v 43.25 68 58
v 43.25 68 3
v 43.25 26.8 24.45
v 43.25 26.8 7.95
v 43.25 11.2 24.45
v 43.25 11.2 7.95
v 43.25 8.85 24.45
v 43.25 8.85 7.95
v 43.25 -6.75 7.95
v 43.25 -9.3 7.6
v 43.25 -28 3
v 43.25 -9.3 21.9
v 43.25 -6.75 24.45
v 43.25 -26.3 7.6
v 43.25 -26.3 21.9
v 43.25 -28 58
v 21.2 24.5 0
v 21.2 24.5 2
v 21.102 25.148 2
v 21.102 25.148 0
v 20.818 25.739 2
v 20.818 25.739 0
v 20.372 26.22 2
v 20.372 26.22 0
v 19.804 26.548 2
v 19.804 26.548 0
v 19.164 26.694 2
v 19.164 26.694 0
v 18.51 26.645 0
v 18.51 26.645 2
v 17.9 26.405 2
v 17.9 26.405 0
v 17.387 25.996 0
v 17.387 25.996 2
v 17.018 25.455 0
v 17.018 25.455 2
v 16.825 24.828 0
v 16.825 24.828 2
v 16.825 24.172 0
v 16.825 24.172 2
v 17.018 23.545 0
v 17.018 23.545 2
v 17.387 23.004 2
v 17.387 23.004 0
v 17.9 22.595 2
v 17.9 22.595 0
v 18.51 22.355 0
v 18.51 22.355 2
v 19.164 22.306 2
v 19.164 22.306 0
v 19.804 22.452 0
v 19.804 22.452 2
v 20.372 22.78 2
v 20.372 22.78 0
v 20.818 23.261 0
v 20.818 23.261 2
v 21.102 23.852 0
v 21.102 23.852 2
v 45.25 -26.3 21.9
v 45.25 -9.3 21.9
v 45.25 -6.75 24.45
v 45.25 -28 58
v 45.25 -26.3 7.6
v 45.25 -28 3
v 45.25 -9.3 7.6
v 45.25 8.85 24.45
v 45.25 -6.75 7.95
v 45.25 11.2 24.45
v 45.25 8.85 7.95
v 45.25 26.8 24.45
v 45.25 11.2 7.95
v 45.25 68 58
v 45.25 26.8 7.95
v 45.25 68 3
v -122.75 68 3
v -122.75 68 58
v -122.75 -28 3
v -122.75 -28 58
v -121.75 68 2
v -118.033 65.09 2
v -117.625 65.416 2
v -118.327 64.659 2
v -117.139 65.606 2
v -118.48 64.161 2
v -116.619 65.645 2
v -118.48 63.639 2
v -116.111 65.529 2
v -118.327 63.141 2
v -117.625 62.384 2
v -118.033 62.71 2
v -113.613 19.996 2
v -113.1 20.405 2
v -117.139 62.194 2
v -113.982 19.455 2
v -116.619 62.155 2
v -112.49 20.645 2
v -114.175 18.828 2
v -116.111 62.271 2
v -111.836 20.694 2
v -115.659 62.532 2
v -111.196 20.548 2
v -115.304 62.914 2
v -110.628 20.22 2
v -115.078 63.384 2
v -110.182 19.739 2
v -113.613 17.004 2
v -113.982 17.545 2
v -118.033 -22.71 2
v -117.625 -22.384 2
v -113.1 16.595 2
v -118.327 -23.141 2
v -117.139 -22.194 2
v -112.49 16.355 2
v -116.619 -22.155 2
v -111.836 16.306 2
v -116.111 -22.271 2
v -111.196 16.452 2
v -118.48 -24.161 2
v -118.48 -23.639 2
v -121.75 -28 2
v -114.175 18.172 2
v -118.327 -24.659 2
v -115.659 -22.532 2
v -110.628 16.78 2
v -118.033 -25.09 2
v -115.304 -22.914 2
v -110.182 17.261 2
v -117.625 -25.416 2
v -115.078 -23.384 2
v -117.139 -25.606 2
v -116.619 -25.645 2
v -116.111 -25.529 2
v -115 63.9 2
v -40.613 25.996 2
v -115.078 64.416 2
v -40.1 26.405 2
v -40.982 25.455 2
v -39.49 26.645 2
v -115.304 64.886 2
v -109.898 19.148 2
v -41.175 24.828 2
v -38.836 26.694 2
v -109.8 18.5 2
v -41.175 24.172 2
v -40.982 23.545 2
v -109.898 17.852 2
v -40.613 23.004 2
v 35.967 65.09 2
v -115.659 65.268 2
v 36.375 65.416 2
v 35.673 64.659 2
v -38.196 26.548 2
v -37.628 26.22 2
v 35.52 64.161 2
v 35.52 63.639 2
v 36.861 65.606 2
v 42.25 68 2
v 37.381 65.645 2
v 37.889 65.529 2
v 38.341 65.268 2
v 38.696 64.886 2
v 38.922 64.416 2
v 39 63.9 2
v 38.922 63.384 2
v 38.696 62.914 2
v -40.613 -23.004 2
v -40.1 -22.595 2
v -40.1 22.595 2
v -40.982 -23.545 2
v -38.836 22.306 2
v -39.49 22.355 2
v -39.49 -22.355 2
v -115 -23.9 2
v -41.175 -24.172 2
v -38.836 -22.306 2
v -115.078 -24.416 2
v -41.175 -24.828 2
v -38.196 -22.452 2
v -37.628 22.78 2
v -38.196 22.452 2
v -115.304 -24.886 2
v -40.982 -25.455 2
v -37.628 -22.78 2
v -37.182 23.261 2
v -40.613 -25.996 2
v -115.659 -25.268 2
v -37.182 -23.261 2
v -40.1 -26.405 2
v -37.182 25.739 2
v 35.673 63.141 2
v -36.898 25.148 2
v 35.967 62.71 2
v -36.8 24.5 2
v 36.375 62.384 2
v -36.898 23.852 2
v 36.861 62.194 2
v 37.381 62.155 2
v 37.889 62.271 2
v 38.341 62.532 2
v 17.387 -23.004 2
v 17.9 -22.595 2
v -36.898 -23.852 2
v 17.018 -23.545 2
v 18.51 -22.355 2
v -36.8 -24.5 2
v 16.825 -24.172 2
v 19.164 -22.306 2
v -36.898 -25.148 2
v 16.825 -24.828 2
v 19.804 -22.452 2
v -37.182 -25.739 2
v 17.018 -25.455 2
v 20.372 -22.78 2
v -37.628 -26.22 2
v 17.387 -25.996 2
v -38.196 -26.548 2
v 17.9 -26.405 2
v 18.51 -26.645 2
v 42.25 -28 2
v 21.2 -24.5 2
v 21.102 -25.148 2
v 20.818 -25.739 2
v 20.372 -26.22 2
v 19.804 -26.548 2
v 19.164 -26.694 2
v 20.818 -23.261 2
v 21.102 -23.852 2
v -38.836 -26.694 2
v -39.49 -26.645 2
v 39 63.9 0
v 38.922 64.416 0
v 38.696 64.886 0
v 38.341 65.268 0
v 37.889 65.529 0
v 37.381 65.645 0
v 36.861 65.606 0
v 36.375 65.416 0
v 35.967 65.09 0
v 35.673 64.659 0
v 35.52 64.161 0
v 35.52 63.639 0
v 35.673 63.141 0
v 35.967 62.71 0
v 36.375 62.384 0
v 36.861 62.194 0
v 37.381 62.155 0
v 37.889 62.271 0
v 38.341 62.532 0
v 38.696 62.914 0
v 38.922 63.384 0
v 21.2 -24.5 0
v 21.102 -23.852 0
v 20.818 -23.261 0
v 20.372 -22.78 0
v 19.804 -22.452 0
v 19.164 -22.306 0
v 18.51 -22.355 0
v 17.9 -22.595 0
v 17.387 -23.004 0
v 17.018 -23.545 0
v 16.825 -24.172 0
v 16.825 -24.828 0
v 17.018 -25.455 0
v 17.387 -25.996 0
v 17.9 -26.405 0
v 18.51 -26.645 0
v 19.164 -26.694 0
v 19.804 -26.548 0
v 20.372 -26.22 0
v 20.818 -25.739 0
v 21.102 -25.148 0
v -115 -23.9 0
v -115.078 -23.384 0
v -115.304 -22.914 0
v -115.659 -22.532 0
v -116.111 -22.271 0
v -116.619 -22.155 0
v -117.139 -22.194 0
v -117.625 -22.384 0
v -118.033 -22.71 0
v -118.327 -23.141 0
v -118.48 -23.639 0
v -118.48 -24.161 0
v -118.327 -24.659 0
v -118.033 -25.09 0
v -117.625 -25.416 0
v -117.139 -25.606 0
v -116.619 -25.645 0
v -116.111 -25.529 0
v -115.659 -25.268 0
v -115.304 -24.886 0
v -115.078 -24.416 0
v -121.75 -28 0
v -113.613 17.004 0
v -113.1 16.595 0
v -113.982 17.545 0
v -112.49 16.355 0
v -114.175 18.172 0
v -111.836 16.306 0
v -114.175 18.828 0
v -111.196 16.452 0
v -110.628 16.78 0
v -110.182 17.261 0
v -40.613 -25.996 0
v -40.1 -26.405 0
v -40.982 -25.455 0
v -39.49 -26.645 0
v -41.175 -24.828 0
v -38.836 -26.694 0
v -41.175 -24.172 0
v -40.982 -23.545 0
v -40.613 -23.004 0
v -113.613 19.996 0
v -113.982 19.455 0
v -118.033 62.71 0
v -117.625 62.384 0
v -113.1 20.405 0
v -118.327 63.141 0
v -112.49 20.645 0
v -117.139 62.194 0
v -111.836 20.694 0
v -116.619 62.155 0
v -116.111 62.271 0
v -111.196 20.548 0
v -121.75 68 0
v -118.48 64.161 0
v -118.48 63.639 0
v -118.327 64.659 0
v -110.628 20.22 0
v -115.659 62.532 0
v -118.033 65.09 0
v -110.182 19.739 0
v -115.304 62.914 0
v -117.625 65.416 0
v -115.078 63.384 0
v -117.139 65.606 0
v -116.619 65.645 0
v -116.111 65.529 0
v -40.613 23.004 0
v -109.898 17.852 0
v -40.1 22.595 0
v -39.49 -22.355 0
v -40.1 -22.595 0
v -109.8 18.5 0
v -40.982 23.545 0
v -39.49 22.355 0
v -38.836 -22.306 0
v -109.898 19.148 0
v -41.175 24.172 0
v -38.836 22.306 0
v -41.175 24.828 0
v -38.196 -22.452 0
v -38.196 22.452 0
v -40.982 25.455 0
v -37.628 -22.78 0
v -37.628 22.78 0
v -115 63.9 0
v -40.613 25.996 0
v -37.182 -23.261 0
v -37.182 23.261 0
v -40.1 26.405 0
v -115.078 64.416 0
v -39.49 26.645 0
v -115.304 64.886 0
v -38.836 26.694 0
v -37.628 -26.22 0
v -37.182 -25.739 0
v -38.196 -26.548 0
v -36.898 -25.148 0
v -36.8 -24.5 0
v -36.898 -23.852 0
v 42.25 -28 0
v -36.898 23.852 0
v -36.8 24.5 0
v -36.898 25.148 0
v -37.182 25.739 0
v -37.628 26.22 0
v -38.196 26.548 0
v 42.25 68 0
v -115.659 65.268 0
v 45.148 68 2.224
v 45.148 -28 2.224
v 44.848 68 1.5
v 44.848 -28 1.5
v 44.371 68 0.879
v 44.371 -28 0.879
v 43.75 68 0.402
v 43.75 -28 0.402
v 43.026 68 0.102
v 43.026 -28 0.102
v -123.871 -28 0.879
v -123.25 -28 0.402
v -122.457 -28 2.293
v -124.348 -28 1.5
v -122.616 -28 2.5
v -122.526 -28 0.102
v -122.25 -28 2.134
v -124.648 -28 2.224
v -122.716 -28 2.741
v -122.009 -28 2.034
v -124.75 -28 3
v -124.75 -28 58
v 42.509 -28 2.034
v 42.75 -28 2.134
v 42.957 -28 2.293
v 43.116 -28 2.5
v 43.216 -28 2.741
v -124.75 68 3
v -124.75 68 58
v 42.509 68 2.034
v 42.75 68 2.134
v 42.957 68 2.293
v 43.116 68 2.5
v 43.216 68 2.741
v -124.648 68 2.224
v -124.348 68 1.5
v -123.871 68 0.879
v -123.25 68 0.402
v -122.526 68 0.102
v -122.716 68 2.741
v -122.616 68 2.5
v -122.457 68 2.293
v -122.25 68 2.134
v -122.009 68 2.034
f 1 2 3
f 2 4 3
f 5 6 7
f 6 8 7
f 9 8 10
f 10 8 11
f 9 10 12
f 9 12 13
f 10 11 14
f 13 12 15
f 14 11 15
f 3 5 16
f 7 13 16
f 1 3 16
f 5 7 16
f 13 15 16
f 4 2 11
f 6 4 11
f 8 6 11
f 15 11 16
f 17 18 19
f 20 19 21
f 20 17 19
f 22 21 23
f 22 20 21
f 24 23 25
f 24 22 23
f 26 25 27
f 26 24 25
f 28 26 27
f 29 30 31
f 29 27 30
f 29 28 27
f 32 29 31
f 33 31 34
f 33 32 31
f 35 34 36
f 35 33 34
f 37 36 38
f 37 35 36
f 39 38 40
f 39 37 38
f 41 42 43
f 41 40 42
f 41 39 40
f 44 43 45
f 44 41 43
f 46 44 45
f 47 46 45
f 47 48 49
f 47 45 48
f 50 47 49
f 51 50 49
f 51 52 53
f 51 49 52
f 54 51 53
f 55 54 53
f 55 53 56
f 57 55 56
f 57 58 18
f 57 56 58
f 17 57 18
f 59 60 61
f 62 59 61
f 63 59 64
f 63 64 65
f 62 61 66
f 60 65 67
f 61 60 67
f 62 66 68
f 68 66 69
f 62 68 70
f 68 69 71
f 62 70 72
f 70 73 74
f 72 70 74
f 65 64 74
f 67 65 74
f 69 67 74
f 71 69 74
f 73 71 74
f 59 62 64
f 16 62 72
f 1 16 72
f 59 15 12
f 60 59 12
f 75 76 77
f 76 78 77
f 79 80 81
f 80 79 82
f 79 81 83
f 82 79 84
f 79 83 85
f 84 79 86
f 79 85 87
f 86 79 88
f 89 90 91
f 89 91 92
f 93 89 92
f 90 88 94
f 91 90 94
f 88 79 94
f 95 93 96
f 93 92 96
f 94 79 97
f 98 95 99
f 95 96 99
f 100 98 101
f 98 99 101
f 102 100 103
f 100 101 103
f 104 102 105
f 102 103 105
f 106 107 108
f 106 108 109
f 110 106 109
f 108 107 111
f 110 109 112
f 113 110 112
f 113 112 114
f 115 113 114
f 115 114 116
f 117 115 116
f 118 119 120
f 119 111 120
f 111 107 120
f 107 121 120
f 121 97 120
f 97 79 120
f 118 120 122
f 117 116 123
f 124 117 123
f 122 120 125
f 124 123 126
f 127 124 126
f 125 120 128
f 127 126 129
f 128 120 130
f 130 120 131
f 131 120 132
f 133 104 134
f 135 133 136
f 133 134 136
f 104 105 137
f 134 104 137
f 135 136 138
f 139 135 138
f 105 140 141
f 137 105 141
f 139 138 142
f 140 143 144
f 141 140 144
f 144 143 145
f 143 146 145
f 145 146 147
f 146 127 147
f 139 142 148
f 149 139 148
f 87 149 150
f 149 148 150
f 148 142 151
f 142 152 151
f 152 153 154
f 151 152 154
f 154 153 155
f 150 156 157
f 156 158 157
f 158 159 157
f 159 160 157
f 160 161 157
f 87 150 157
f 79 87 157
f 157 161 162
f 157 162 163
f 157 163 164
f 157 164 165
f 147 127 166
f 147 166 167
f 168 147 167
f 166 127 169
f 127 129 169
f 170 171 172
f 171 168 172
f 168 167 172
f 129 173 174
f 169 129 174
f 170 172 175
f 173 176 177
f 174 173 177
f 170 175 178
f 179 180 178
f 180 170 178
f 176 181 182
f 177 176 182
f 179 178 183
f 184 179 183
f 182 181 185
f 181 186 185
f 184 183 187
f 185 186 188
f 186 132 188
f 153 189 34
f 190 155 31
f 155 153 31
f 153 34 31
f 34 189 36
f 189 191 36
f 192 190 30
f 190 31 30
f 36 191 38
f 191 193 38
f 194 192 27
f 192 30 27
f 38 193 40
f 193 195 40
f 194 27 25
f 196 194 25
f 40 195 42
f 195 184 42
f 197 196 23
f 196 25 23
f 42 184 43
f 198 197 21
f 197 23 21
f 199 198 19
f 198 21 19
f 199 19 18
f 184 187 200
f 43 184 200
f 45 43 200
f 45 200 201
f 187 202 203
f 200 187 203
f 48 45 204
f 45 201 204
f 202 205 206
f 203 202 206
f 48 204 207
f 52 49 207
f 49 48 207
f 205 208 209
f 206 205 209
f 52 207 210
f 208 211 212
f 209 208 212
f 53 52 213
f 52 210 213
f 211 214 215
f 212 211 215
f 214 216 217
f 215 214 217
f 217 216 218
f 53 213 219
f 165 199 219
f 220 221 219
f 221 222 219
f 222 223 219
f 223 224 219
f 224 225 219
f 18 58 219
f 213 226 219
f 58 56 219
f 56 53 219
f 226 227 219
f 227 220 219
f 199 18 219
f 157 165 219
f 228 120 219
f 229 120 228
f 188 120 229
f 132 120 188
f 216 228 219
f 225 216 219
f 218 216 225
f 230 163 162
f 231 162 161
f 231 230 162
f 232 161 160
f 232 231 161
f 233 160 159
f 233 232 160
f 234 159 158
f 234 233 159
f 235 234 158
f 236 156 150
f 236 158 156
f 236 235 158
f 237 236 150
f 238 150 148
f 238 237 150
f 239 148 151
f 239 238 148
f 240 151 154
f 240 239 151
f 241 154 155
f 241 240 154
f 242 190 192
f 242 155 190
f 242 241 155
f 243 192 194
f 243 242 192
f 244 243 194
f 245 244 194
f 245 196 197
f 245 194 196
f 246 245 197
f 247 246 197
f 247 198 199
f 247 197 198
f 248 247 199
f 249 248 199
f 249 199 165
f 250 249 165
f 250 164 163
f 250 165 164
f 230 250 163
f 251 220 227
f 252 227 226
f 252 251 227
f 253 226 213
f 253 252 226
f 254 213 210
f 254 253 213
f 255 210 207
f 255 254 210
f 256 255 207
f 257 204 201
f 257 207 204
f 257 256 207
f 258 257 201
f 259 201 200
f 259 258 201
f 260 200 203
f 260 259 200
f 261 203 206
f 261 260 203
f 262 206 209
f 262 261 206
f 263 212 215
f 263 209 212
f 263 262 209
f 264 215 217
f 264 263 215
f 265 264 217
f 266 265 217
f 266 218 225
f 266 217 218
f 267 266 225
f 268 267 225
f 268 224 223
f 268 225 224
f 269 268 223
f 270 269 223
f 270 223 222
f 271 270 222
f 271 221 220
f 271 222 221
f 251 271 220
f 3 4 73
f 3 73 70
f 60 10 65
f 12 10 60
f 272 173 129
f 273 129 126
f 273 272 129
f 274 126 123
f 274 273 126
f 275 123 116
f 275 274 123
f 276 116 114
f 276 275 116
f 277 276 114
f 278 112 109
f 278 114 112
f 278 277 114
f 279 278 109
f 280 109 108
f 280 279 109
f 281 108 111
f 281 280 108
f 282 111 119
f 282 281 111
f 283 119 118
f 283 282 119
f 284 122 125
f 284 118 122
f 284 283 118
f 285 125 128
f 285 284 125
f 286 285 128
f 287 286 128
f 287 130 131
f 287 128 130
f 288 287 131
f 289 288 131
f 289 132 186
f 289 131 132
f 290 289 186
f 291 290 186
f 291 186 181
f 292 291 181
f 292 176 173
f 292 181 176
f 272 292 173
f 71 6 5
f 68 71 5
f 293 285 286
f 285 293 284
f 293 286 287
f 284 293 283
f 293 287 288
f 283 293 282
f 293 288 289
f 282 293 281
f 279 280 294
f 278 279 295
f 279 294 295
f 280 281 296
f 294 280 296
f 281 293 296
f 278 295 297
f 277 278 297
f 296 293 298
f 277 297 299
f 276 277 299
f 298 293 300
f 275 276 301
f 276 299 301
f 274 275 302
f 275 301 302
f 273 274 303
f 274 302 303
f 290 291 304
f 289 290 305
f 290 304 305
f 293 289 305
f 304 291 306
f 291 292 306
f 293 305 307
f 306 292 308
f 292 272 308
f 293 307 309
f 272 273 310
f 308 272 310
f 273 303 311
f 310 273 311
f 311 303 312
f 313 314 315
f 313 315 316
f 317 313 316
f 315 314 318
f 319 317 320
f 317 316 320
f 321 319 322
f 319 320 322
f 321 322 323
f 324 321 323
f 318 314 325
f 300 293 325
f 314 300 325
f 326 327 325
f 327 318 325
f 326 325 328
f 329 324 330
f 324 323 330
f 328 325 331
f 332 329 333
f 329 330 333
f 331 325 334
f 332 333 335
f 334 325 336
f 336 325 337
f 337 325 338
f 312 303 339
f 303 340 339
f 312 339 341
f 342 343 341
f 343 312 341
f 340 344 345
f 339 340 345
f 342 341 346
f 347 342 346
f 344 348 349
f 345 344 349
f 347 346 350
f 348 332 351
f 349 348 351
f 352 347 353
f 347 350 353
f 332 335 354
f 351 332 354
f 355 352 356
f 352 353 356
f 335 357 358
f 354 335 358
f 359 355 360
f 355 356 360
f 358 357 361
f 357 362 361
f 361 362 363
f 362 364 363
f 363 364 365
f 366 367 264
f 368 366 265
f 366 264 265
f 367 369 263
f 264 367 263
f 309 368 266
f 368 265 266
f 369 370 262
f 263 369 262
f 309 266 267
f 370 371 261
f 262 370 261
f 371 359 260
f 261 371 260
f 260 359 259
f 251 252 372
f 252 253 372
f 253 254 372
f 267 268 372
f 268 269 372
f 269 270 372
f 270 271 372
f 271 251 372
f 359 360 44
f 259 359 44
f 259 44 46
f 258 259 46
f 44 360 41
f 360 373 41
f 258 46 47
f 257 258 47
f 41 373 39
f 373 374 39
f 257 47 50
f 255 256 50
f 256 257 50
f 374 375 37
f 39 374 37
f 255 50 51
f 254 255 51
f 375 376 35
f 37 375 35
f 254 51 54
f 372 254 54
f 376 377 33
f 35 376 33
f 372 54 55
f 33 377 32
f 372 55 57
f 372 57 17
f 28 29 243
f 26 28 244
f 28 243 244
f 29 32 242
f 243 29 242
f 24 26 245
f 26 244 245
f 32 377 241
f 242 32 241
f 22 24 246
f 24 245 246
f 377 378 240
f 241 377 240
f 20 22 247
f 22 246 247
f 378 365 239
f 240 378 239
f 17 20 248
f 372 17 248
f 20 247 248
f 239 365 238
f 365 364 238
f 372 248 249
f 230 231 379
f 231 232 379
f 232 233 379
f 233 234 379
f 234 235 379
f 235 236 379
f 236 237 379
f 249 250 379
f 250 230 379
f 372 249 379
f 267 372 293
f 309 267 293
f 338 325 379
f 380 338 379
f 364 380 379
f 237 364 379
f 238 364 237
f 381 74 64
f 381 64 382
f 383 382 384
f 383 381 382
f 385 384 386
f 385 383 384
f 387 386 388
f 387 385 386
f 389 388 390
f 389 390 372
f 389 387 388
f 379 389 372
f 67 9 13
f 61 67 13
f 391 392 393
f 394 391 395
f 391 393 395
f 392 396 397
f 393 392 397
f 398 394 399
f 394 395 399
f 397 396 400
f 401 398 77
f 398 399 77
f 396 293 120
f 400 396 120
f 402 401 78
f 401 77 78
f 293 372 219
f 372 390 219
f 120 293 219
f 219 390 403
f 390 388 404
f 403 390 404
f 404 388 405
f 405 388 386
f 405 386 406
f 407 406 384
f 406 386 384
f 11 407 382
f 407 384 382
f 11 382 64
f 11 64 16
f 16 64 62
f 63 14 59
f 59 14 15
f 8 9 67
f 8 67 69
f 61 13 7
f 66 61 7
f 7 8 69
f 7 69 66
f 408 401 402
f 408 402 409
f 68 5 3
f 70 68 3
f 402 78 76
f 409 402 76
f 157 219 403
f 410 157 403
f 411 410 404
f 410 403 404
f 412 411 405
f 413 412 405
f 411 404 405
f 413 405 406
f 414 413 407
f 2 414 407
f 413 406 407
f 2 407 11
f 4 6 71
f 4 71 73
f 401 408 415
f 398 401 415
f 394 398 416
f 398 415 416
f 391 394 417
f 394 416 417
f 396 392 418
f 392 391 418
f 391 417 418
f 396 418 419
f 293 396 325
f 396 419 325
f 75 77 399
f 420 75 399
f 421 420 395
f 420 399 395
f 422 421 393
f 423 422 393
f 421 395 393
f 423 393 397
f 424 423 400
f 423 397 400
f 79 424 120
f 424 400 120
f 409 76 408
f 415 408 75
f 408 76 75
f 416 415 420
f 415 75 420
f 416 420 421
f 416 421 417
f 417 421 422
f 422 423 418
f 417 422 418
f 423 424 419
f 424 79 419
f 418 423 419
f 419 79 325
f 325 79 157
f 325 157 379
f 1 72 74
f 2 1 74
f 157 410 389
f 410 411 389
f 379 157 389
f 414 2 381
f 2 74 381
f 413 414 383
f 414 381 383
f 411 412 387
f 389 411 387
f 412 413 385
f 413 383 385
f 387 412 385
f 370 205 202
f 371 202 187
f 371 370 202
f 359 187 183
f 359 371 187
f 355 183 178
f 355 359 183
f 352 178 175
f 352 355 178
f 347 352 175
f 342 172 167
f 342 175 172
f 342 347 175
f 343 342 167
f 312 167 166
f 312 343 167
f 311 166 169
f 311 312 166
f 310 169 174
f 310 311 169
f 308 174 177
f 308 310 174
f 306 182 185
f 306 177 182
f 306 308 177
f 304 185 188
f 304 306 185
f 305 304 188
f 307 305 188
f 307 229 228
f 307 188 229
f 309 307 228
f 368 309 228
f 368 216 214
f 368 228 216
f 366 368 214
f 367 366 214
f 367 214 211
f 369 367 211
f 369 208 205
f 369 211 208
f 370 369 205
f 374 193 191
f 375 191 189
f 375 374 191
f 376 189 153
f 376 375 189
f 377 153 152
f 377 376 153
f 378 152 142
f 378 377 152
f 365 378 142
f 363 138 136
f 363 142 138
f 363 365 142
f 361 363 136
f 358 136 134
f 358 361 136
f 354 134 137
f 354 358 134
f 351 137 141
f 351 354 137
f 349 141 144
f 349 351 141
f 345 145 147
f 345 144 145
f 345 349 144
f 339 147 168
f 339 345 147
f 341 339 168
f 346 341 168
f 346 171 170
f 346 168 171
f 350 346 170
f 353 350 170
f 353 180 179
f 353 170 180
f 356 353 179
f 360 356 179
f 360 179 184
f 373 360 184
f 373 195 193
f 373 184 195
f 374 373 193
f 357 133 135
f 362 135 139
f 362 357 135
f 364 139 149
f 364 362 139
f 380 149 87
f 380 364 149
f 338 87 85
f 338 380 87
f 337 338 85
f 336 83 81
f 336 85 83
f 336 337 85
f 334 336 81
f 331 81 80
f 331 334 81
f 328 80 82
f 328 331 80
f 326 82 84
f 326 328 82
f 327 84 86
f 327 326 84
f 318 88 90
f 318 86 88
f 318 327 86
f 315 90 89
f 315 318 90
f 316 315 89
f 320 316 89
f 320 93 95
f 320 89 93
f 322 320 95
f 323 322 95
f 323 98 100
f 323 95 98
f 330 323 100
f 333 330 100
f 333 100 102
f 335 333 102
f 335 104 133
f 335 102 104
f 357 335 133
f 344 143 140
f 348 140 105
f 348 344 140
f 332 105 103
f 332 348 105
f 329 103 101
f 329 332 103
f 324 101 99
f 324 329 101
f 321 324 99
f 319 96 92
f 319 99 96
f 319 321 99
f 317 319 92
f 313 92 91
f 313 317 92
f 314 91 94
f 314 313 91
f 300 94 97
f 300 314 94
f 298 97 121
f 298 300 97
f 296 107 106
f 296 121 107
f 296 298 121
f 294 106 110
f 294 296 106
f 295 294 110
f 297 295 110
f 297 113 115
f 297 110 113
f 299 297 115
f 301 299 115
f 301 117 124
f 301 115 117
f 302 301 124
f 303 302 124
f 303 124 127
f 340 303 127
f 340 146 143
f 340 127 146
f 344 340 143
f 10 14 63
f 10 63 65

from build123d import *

# Parameters (mm, degrees)
PAD002_DEPTH    = 250
PAD003_DEPTH    = 150
SKETCH_W        = 170
SKETCH_H        = 100
PAD_DEPTH       = 60
FILLET_R        = 3
SKETCH001_W     = 17
SKETCH001_H     = 14.3
SKETCH001_W_2   = 15.6
SKETCH001_H_2   = 16.5
POCKET_DEPTH    = 45.251
SKETCH002_W     = 8.2
SKETCH002_H     = 4.6
POCKET001_DEPTH = 30.001
SKETCH006_W     = 165
SKETCH006_H     = 92
POCKET003_DEPTH = 500
SKETCH007_R     = 2.2
SKETCH007_R_2   = 1.75
POCKET004_DEPTH = 5


with BuildPart() as bottom_mask:
    # Sketch004 → Pad002 (new body, symmetric)
    with BuildSketch(Plane.XZ):
        with BuildLine():
            Line((-122.75, 60), (-122.75, 2.999996))
            ThreePointArc((-122.75, 2.999996), (-122.457105, 2.292892), (-121.75, 2))
            Line((-121.75, 2), (42.25, 2))
            ThreePointArc((42.25, 2), (42.957105, 2.292892), (43.25, 2.999996))
            Line((43.25, 2.999996), (43.25, 60))
            Line((43.25, 60), (-122.75, 60))
        make_face()
    extrude(amount=PAD002_DEPTH, both=True)

    # Sketch008 → Pad003 (join, symmetric)
    with BuildSketch(Plane.YZ):
        Polygon((-30, 60), (-30, 0), (-28, 0), (-28, 58), (68, 58), (68, 0), (70, 0), (70, 60), align=None)
    extrude(amount=PAD003_DEPTH, both=True)


with BuildPart() as bottom:
    # Sketch → Pad (new body)
    with BuildSketch(Plane.XY):
        with Locations((-39.75, 20)):
            Rectangle(SKETCH_W, SKETCH_H)
    extrude(amount=PAD_DEPTH)

    # Fillet
    fillet_edges = [bottom.edges().sort_by_distance(p)[0] for p in [
        (45.25, 20, 0),
        (-39.75, -30, 60),
        (-39.75, 70, 60),
        (-124.75, 20, 0),
    ]]
    fillet(fillet_edges, radius=FILLET_R)

    # Sketch001 → Pocket (cut, through all)
    with BuildSketch(Plane.YZ):
        with Locations((-17.8, 14.75)):
            Rectangle(SKETCH001_W, SKETCH001_H)
        with Locations((1.05, 16.2)):
            Rectangle(SKETCH001_W_2, SKETCH001_H_2)
        with Locations((19, 16.2)):
            Rectangle(SKETCH001_W_2, SKETCH001_H_2)
    extrude(amount=POCKET_DEPTH, mode=Mode.SUBTRACT)

    # Sketch002 → Pocket001 (cut, through all)
    with BuildSketch(Plane.XZ):
        with BuildLine():
            ThreePointArc((-34.67, 11.2), (-35.73066, 10.76066), (-36.17, 9.7))
            Line((-36.17, 8.74), (-36.17, 9.7))
            ThreePointArc((-36.17, 8.74), (-35.73066, 7.67934), (-34.67, 7.24))
            Line((-27.93, 7.24), (-34.67, 7.24))
            ThreePointArc((-27.93, 7.24), (-26.86934, 7.67934), (-26.43, 8.74))
            Line((-26.43, 9.7), (-26.43, 8.74))
            ThreePointArc((-26.43, 9.7), (-26.86934, 10.76066), (-27.93, 11.2))
            Line((-34.67, 11.2), (-27.93, 11.2))
        make_face()
        with Locations((-16.704733, 9.1)):
            Rectangle(SKETCH002_W, SKETCH002_H)
        with Locations((-3.304733, 9.1)):
            Rectangle(SKETCH002_W, SKETCH002_H)
    extrude(amount=POCKET001_DEPTH, mode=Mode.SUBTRACT)

    # Sketch006 → Pocket003 (cut)
    with BuildSketch(Plane.XY.offset(30)):
        with Locations((-39.75, 20)):
            Rectangle(SKETCH006_W, SKETCH006_H)
    extrude(amount=POCKET003_DEPTH, mode=Mode.SUBTRACT)

    # Sketch007 → Pocket004 (cut)
    with BuildSketch(Plane.XY):
        with Locations((-39, 24.5)):
            Circle(SKETCH007_R)
        with Locations((19, 24.5)):
            Circle(SKETCH007_R)
        with Locations((-39, -24.5)):
            Circle(SKETCH007_R)
        with Locations((19, -24.5)):
            Circle(SKETCH007_R)
        with Locations((-112, 18.5)):
            Circle(SKETCH007_R)
        with Locations((-116.75, -23.9)):
            Circle(SKETCH007_R_2)
        with Locations((-116.75, 63.9)):
            Circle(SKETCH007_R_2)
        with Locations((37.25, 63.9)):
            Circle(SKETCH007_R_2)
    extrude(amount=POCKET004_DEPTH, mode=Mode.SUBTRACT)

    # Cut001: cut Bottom Mask
    add(bottom_mask.part, mode=Mode.SUBTRACT)


solid = bottom.part
